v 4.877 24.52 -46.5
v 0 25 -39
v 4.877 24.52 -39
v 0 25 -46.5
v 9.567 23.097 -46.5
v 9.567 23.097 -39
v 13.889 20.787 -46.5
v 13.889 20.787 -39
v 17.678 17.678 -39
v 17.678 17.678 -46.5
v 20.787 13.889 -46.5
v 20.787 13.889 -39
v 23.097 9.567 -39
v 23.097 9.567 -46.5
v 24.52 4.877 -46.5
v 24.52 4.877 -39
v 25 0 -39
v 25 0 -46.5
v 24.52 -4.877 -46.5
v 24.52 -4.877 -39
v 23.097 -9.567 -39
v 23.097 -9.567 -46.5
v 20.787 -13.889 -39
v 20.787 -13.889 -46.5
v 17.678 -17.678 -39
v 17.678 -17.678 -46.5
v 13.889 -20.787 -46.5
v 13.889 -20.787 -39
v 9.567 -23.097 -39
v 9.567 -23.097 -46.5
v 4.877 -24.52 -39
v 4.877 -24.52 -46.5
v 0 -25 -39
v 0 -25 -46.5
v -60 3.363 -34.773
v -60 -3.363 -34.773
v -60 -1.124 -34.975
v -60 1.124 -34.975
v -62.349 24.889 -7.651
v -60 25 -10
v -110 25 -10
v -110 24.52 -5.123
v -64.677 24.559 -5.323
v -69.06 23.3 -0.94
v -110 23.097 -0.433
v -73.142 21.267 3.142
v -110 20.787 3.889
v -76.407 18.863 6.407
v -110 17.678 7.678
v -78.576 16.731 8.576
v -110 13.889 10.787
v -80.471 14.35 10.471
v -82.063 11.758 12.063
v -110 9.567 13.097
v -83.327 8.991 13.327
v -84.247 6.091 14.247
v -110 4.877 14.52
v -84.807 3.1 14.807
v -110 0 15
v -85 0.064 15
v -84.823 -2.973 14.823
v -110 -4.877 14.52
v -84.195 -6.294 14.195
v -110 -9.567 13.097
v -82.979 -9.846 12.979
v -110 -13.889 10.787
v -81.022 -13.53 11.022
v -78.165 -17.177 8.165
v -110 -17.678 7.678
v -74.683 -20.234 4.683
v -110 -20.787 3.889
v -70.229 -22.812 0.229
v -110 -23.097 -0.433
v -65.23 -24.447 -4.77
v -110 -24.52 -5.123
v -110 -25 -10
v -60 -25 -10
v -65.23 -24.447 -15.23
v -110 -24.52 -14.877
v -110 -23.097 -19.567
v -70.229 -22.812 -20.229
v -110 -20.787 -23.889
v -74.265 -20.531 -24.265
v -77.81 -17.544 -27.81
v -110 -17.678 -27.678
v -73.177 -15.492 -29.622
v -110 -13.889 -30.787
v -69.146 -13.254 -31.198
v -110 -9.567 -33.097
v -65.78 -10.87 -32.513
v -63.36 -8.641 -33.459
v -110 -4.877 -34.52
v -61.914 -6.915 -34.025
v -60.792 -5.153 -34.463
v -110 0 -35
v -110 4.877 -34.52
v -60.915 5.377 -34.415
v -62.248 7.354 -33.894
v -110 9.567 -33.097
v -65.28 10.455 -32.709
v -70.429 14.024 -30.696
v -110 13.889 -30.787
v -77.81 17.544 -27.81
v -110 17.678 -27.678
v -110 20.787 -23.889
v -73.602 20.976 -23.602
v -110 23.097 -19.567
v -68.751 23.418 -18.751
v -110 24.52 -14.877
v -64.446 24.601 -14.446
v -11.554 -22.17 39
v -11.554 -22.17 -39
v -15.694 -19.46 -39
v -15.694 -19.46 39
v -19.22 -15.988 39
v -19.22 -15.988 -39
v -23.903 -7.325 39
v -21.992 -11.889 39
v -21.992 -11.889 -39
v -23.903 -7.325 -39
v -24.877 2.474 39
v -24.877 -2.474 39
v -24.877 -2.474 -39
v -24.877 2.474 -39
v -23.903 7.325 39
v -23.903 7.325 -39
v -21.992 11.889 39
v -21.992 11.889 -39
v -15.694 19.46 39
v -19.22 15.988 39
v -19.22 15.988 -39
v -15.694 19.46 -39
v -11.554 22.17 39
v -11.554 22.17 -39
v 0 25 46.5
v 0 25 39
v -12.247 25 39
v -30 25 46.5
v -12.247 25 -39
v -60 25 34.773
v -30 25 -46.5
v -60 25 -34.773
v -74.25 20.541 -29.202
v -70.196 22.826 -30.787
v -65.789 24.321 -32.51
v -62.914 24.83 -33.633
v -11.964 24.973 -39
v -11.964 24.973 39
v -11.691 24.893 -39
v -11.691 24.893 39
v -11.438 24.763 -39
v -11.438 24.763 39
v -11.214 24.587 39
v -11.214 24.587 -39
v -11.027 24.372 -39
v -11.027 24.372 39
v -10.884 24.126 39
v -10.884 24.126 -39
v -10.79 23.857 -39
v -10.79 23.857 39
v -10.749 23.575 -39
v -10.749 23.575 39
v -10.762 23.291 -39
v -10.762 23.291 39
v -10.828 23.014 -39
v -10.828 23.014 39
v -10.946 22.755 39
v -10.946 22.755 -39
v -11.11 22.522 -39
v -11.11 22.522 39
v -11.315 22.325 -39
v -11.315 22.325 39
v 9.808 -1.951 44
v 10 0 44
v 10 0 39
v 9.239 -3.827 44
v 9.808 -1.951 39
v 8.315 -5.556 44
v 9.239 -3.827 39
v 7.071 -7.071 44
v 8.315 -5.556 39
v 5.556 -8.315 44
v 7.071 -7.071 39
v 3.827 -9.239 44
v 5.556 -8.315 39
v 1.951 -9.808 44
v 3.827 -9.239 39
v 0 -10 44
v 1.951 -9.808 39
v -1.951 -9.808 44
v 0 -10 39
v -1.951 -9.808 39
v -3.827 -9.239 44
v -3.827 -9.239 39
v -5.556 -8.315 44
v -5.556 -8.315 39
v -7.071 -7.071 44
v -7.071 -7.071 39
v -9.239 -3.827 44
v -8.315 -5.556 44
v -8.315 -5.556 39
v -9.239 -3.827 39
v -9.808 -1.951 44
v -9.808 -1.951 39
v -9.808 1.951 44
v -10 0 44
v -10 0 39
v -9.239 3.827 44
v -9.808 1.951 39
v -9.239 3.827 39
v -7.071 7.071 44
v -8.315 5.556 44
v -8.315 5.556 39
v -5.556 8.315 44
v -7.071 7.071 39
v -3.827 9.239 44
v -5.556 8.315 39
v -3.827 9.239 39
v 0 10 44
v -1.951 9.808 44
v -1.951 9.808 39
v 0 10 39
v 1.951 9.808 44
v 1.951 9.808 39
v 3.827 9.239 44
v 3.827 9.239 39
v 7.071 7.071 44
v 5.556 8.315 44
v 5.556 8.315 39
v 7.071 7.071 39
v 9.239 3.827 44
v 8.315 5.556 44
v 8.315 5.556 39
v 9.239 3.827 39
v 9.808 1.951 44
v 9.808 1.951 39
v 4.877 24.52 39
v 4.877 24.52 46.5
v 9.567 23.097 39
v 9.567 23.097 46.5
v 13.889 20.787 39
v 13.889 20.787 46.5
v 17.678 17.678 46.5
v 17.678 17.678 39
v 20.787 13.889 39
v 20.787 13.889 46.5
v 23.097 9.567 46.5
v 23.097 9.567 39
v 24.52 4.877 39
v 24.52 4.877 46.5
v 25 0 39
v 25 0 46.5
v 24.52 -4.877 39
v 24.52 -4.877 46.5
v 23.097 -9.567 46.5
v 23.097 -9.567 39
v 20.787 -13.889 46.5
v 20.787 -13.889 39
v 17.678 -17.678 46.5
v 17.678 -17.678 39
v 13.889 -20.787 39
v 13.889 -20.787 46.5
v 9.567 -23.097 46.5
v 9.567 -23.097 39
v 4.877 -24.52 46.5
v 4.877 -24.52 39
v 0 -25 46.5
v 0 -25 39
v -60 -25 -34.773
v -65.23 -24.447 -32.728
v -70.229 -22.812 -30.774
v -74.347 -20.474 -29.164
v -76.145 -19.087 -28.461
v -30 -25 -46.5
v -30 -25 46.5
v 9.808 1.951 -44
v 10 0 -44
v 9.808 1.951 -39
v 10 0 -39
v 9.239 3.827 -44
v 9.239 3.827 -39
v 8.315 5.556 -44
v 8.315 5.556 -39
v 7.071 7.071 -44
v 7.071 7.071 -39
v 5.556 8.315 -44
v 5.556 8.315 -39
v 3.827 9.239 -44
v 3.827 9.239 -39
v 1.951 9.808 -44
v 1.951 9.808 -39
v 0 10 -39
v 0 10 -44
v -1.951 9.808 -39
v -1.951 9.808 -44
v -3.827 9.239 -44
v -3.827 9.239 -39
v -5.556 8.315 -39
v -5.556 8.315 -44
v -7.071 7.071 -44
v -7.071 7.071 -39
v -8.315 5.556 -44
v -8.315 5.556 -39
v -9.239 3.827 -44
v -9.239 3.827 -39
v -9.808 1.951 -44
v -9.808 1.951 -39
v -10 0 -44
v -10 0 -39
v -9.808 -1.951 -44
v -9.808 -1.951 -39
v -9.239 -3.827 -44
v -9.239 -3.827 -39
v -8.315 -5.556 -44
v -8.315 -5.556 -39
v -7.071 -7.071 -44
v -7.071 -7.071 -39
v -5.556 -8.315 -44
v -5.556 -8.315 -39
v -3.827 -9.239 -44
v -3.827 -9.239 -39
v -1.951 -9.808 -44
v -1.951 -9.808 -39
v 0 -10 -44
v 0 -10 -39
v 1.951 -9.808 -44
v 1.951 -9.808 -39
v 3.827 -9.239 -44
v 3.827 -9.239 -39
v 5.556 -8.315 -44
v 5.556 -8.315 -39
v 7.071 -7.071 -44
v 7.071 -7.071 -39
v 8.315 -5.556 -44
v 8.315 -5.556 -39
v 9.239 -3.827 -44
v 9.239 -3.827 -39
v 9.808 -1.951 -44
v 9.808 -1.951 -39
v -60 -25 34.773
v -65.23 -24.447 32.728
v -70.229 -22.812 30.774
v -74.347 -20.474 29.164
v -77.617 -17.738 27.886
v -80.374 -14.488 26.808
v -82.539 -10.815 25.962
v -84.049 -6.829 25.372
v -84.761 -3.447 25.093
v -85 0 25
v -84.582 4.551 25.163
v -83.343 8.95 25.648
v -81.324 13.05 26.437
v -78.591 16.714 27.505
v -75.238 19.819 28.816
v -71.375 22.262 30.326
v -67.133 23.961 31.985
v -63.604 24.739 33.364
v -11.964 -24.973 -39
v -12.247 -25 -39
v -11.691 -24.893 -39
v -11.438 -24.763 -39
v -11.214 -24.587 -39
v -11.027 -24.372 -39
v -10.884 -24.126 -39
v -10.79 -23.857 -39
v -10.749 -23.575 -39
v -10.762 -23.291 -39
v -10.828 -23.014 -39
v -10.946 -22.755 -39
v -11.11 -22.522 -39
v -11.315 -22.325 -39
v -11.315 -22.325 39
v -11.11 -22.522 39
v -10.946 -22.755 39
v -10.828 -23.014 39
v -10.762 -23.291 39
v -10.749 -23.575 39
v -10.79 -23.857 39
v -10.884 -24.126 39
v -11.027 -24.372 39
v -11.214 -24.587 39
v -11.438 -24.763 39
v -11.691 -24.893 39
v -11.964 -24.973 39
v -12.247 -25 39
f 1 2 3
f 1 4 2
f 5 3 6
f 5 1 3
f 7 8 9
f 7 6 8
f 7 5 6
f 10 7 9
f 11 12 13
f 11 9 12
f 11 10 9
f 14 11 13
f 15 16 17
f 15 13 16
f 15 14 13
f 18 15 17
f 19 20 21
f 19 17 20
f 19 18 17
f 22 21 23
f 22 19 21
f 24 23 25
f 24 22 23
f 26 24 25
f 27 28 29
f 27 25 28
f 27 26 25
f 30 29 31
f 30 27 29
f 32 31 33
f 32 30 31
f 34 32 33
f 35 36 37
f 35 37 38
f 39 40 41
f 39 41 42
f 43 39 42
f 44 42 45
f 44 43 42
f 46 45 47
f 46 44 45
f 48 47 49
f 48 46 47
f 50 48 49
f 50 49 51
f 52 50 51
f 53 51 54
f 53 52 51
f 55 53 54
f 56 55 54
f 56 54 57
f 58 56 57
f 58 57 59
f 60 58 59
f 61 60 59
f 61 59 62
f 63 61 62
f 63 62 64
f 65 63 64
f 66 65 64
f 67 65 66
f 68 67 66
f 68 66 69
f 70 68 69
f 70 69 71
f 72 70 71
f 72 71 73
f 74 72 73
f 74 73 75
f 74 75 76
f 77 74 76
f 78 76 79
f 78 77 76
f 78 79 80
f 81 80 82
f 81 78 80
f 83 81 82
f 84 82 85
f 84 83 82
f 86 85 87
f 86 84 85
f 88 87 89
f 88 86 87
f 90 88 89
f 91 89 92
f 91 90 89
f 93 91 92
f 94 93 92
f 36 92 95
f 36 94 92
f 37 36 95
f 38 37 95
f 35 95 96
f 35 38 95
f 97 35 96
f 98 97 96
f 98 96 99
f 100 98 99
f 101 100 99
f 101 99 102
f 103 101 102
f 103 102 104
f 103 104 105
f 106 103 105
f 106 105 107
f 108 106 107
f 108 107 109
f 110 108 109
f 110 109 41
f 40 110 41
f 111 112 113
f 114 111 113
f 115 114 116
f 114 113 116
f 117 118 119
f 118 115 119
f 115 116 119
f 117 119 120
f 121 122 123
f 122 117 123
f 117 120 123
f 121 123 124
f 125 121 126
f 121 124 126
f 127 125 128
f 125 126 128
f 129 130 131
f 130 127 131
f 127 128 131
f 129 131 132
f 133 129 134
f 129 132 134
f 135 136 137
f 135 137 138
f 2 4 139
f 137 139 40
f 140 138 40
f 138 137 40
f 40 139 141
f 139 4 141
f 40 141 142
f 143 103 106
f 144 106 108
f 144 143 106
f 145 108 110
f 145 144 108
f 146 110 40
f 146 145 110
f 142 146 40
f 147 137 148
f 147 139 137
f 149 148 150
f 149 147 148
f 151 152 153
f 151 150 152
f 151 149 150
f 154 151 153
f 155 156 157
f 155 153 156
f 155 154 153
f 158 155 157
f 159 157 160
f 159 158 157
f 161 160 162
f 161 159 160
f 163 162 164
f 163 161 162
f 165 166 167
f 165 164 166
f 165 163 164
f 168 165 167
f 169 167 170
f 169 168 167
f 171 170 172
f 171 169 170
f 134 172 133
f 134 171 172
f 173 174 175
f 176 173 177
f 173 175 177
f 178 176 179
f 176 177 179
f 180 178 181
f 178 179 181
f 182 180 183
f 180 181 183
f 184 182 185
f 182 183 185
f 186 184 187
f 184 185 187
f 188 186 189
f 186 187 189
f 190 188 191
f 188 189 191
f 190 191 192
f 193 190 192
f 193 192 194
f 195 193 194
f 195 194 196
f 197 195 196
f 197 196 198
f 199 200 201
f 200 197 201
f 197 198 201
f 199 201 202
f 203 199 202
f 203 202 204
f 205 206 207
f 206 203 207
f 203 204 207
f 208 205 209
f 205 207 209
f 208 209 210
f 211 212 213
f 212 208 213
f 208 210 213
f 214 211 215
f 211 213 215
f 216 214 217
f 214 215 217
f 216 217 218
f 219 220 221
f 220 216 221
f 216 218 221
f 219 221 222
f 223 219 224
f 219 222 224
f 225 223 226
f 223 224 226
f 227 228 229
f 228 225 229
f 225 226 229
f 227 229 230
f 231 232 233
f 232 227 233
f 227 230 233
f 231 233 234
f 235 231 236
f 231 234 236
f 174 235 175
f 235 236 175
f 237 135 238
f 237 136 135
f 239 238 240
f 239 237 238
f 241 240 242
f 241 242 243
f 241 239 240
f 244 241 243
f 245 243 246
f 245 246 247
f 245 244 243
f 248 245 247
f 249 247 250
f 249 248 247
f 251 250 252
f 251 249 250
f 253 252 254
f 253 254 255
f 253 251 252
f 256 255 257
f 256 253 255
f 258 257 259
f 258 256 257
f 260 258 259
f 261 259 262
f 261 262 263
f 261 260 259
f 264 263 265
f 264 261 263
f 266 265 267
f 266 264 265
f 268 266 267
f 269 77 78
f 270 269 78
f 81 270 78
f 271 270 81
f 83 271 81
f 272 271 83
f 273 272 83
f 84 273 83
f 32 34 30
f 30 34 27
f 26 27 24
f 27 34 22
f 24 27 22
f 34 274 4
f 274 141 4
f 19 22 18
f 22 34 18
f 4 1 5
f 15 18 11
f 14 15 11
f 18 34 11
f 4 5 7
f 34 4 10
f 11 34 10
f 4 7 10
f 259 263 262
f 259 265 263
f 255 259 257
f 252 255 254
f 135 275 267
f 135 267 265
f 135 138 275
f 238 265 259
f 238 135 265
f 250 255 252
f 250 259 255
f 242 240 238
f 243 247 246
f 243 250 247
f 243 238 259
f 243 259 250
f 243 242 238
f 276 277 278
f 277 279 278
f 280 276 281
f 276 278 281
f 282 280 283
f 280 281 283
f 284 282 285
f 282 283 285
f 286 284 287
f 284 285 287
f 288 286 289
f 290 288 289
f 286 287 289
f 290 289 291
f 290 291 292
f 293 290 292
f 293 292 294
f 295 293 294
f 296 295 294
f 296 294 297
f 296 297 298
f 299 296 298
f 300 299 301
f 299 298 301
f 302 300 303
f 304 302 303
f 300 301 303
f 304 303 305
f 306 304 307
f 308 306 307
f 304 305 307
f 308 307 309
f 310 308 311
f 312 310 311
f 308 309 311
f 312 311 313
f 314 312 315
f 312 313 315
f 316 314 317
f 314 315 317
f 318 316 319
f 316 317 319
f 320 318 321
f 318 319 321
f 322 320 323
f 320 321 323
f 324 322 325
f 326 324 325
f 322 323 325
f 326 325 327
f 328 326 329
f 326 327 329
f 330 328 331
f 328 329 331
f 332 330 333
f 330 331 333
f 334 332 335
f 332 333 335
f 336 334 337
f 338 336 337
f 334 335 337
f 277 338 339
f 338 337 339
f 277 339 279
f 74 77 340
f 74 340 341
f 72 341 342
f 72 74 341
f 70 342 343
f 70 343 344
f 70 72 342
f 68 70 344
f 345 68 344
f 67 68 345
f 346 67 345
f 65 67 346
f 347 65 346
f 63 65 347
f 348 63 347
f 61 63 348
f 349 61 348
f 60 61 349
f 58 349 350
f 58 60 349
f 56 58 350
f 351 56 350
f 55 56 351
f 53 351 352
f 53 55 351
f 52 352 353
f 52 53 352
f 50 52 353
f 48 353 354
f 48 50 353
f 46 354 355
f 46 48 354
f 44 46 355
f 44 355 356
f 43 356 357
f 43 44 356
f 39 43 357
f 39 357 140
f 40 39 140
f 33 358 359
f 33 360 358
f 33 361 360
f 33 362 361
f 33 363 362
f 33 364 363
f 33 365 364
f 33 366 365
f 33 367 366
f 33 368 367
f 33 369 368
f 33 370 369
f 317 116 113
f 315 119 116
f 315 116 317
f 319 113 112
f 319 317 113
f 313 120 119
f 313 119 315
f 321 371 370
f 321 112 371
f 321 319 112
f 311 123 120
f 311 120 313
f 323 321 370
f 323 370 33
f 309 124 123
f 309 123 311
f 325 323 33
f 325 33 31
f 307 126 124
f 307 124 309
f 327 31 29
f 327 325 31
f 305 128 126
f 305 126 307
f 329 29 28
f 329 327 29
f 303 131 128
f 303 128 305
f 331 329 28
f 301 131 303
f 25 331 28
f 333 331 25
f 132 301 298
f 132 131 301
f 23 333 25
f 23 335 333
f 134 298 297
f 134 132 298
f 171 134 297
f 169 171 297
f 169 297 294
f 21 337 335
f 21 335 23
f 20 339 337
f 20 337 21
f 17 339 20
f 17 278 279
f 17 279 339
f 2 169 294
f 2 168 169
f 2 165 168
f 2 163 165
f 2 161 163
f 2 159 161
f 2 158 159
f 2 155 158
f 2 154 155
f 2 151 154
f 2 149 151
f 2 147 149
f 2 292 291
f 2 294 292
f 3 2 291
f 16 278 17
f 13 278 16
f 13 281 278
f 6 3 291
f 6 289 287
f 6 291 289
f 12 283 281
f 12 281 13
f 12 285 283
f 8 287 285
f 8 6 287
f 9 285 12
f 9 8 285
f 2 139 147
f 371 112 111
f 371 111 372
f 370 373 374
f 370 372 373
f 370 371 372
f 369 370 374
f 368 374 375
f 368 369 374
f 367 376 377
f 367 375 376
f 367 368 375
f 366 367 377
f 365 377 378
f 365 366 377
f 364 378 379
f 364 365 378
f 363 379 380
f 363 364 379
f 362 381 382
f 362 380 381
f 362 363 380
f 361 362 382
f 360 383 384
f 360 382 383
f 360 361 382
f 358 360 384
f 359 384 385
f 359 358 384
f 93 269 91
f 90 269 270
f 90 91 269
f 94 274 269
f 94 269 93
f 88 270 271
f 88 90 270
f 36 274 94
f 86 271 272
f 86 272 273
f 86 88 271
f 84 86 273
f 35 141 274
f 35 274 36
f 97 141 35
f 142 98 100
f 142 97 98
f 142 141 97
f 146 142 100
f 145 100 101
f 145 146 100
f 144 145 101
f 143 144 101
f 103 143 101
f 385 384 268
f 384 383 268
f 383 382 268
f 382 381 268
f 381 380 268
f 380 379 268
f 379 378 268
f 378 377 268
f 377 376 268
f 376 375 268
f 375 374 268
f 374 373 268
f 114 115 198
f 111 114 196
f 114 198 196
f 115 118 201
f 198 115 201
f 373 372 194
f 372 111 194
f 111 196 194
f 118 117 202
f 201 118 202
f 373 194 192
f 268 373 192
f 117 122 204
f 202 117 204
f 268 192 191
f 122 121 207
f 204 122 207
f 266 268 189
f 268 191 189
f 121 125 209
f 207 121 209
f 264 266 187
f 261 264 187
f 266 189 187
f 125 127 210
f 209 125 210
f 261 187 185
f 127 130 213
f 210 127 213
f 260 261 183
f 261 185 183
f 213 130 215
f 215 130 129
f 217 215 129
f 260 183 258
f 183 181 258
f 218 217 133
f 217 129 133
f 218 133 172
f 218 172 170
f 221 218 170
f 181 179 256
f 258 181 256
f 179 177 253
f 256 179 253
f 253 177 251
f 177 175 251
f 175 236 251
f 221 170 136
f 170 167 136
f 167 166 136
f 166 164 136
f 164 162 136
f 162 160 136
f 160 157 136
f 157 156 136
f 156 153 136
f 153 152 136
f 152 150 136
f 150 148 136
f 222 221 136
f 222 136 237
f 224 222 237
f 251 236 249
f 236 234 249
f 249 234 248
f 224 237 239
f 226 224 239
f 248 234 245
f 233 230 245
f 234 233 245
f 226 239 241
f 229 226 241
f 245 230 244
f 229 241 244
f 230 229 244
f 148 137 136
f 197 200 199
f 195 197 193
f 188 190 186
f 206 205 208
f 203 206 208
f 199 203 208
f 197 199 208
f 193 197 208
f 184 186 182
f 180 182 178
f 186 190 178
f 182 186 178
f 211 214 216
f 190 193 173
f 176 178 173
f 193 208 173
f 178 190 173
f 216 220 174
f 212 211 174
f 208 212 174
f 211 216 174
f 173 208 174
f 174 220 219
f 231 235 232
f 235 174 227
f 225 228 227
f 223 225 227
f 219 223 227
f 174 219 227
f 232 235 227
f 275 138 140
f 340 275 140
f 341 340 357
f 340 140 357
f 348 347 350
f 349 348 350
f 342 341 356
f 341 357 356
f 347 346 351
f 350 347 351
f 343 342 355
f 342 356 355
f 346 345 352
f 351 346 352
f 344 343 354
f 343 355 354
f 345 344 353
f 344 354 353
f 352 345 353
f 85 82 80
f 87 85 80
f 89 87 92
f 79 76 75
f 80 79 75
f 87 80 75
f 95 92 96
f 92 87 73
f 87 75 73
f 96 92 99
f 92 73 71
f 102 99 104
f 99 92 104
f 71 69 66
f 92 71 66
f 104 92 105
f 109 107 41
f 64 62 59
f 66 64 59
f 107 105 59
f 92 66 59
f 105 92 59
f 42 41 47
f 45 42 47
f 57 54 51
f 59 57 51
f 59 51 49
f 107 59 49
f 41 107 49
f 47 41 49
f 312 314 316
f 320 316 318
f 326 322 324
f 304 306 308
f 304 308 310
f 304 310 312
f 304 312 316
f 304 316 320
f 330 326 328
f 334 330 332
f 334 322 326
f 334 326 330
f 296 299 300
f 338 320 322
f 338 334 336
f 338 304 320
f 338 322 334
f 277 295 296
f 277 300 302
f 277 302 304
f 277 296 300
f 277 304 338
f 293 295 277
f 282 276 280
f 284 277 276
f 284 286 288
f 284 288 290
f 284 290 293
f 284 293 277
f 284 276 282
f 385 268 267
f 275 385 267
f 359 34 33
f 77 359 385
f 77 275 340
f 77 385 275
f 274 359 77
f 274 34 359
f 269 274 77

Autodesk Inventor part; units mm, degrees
ref_plane "XZ Plane" through (0, 0, 0) normal (0, 1, 0) x (-1, 0, 0)
ref_plane "XY Plane" through (0, 0, 0) normal (0, 0, 1) x (1, 0, 0)
sketch "Sketch1" plane through (0, 0, 0) normal (0, 0, 1) x (1, 0, 0)
  circle A0 centre (0, 0) radius 25
  line L0 (0, 25) -> (-60, 25)
  line L1 (0, -25) -> (-60, -25)
  arc A1 (-60, 25) -> (-60, -25) centre (-60, 0) ccw
  dimension "d0" = 50
  dimension "d1" = 60
  dimension "d2" = 60
  dimension "d3" = 25
extrude "Extrusion1" add sketch "Sketch1" along normal mid plane 93
sketch "Sketch2" plane through (0, 0, 0) normal (0, 0, 1) x (1, 0, 0)
  arc A0 (0, -25) -> (0, 25) centre (0, 0) ccw
  arc A1 (-12.2474, 25) -> (-11.5542, 22.1698) centre (-12.2474, 23.5) ccw construction
  arc A2 (-11.5542, -22.1698) -> (-12.2474, -25) centre (-12.2474, -23.5) ccw construction
  line L0 (0, -25) -> (-60, -25) projected
  line L1 (-60, 25) -> (0, 25) projected
  line L2 (-12.2474, 25) -> (0, 25)
  arc A3 (0, -25) -> (0, 25) centre (0, 0) ccw projected
  line L3 (-12.2474, -25) -> (0, -25)
  arc A4 (-11.5542, -22.1698) -> (0, -25) centre (0, 0) ccw construction
  arc A5 (-12.2474, -25) -> (-11.5542, -22.1698) centre (-12.2474, -23.5) ccw
  arc A6 (-11.5542, 22.1698) -> (-12.2474, 25) centre (-12.2474, 23.5) ccw
  arc A7 (-11.5542, 22.1698) -> (-11.5542, -22.1698) centre (0, 0) ccw
  arc A8 (0, 25) -> (-11.5542, 22.1698) centre (0, 0) ccw construction
  dimension "d7" = 3
  dimension "d8" = 3
extrude "Extrusion2" cut sketch "Sketch2" along normal mid plane 78
sketch "Sketch3" plane through (0, 0, 0) normal (0, 0, 1) x (1, 0, 0)
  circle A0 centre (0, 0) radius 10
  dimension "d11" = 20
extrude "Extrusion3" cut sketch "Sketch3" along normal mid plane 88
sketch "Sketch4" plane through (-60, 25, -46.5) normal (0, 1, 0) x (1, 0, 0)
  line L0 (35, -7.5) -> (35, -85.5) projected
  line L1 (0, -93) -> (60, -93) projected
  line L2 (30, -93) -> (30, 0)
  line L3 (60, 0) -> (0, 0) projected
  line L4 (30, -93) -> (-25, -71.5)
  line L5 (-25, 0) -> (-25, -93) projected
  line L6 (-25, -71.5) -> (-25, -93)
  line L7 (30, -93) -> (-25, -93)
  line L8 (30, 0) -> (-25, -21.5)
  line L9 (-25, 0) -> (30, 0)
  line L10 (-25, -21.5) -> (-25, 0)
  point P0 (60, -46.5)
  dimension "d14" = 5
  dimension "d15" = 50
  dimension "d16" = 21.5
extrude "Extrusion4" cut sketch "Sketch4" against normal through all contours L7 L5 L4 L1 | L8 L5 L9 L3
ref_plane "Work Plane1" through (-60, 0, 0) normal (1, 0, 0) x (0, 1, 0)
sketch "Sketch5" plane through (-60, 0, 0) normal (1, 0, 0) x (0, 1, 0)
  circle A0 centre (0, -10) radius 25
  line L0 (-25, -46.5) -> (25, -46.5) projected
  line L1 (0, -46.5) -> (0, -10)
  dimension "d20" = 50
  dimension "d23" = 36.5
extrude "Extrusion5" add sketch "Sketch5" against normal blind 50
properties part number "Arm 5 v0.1"
